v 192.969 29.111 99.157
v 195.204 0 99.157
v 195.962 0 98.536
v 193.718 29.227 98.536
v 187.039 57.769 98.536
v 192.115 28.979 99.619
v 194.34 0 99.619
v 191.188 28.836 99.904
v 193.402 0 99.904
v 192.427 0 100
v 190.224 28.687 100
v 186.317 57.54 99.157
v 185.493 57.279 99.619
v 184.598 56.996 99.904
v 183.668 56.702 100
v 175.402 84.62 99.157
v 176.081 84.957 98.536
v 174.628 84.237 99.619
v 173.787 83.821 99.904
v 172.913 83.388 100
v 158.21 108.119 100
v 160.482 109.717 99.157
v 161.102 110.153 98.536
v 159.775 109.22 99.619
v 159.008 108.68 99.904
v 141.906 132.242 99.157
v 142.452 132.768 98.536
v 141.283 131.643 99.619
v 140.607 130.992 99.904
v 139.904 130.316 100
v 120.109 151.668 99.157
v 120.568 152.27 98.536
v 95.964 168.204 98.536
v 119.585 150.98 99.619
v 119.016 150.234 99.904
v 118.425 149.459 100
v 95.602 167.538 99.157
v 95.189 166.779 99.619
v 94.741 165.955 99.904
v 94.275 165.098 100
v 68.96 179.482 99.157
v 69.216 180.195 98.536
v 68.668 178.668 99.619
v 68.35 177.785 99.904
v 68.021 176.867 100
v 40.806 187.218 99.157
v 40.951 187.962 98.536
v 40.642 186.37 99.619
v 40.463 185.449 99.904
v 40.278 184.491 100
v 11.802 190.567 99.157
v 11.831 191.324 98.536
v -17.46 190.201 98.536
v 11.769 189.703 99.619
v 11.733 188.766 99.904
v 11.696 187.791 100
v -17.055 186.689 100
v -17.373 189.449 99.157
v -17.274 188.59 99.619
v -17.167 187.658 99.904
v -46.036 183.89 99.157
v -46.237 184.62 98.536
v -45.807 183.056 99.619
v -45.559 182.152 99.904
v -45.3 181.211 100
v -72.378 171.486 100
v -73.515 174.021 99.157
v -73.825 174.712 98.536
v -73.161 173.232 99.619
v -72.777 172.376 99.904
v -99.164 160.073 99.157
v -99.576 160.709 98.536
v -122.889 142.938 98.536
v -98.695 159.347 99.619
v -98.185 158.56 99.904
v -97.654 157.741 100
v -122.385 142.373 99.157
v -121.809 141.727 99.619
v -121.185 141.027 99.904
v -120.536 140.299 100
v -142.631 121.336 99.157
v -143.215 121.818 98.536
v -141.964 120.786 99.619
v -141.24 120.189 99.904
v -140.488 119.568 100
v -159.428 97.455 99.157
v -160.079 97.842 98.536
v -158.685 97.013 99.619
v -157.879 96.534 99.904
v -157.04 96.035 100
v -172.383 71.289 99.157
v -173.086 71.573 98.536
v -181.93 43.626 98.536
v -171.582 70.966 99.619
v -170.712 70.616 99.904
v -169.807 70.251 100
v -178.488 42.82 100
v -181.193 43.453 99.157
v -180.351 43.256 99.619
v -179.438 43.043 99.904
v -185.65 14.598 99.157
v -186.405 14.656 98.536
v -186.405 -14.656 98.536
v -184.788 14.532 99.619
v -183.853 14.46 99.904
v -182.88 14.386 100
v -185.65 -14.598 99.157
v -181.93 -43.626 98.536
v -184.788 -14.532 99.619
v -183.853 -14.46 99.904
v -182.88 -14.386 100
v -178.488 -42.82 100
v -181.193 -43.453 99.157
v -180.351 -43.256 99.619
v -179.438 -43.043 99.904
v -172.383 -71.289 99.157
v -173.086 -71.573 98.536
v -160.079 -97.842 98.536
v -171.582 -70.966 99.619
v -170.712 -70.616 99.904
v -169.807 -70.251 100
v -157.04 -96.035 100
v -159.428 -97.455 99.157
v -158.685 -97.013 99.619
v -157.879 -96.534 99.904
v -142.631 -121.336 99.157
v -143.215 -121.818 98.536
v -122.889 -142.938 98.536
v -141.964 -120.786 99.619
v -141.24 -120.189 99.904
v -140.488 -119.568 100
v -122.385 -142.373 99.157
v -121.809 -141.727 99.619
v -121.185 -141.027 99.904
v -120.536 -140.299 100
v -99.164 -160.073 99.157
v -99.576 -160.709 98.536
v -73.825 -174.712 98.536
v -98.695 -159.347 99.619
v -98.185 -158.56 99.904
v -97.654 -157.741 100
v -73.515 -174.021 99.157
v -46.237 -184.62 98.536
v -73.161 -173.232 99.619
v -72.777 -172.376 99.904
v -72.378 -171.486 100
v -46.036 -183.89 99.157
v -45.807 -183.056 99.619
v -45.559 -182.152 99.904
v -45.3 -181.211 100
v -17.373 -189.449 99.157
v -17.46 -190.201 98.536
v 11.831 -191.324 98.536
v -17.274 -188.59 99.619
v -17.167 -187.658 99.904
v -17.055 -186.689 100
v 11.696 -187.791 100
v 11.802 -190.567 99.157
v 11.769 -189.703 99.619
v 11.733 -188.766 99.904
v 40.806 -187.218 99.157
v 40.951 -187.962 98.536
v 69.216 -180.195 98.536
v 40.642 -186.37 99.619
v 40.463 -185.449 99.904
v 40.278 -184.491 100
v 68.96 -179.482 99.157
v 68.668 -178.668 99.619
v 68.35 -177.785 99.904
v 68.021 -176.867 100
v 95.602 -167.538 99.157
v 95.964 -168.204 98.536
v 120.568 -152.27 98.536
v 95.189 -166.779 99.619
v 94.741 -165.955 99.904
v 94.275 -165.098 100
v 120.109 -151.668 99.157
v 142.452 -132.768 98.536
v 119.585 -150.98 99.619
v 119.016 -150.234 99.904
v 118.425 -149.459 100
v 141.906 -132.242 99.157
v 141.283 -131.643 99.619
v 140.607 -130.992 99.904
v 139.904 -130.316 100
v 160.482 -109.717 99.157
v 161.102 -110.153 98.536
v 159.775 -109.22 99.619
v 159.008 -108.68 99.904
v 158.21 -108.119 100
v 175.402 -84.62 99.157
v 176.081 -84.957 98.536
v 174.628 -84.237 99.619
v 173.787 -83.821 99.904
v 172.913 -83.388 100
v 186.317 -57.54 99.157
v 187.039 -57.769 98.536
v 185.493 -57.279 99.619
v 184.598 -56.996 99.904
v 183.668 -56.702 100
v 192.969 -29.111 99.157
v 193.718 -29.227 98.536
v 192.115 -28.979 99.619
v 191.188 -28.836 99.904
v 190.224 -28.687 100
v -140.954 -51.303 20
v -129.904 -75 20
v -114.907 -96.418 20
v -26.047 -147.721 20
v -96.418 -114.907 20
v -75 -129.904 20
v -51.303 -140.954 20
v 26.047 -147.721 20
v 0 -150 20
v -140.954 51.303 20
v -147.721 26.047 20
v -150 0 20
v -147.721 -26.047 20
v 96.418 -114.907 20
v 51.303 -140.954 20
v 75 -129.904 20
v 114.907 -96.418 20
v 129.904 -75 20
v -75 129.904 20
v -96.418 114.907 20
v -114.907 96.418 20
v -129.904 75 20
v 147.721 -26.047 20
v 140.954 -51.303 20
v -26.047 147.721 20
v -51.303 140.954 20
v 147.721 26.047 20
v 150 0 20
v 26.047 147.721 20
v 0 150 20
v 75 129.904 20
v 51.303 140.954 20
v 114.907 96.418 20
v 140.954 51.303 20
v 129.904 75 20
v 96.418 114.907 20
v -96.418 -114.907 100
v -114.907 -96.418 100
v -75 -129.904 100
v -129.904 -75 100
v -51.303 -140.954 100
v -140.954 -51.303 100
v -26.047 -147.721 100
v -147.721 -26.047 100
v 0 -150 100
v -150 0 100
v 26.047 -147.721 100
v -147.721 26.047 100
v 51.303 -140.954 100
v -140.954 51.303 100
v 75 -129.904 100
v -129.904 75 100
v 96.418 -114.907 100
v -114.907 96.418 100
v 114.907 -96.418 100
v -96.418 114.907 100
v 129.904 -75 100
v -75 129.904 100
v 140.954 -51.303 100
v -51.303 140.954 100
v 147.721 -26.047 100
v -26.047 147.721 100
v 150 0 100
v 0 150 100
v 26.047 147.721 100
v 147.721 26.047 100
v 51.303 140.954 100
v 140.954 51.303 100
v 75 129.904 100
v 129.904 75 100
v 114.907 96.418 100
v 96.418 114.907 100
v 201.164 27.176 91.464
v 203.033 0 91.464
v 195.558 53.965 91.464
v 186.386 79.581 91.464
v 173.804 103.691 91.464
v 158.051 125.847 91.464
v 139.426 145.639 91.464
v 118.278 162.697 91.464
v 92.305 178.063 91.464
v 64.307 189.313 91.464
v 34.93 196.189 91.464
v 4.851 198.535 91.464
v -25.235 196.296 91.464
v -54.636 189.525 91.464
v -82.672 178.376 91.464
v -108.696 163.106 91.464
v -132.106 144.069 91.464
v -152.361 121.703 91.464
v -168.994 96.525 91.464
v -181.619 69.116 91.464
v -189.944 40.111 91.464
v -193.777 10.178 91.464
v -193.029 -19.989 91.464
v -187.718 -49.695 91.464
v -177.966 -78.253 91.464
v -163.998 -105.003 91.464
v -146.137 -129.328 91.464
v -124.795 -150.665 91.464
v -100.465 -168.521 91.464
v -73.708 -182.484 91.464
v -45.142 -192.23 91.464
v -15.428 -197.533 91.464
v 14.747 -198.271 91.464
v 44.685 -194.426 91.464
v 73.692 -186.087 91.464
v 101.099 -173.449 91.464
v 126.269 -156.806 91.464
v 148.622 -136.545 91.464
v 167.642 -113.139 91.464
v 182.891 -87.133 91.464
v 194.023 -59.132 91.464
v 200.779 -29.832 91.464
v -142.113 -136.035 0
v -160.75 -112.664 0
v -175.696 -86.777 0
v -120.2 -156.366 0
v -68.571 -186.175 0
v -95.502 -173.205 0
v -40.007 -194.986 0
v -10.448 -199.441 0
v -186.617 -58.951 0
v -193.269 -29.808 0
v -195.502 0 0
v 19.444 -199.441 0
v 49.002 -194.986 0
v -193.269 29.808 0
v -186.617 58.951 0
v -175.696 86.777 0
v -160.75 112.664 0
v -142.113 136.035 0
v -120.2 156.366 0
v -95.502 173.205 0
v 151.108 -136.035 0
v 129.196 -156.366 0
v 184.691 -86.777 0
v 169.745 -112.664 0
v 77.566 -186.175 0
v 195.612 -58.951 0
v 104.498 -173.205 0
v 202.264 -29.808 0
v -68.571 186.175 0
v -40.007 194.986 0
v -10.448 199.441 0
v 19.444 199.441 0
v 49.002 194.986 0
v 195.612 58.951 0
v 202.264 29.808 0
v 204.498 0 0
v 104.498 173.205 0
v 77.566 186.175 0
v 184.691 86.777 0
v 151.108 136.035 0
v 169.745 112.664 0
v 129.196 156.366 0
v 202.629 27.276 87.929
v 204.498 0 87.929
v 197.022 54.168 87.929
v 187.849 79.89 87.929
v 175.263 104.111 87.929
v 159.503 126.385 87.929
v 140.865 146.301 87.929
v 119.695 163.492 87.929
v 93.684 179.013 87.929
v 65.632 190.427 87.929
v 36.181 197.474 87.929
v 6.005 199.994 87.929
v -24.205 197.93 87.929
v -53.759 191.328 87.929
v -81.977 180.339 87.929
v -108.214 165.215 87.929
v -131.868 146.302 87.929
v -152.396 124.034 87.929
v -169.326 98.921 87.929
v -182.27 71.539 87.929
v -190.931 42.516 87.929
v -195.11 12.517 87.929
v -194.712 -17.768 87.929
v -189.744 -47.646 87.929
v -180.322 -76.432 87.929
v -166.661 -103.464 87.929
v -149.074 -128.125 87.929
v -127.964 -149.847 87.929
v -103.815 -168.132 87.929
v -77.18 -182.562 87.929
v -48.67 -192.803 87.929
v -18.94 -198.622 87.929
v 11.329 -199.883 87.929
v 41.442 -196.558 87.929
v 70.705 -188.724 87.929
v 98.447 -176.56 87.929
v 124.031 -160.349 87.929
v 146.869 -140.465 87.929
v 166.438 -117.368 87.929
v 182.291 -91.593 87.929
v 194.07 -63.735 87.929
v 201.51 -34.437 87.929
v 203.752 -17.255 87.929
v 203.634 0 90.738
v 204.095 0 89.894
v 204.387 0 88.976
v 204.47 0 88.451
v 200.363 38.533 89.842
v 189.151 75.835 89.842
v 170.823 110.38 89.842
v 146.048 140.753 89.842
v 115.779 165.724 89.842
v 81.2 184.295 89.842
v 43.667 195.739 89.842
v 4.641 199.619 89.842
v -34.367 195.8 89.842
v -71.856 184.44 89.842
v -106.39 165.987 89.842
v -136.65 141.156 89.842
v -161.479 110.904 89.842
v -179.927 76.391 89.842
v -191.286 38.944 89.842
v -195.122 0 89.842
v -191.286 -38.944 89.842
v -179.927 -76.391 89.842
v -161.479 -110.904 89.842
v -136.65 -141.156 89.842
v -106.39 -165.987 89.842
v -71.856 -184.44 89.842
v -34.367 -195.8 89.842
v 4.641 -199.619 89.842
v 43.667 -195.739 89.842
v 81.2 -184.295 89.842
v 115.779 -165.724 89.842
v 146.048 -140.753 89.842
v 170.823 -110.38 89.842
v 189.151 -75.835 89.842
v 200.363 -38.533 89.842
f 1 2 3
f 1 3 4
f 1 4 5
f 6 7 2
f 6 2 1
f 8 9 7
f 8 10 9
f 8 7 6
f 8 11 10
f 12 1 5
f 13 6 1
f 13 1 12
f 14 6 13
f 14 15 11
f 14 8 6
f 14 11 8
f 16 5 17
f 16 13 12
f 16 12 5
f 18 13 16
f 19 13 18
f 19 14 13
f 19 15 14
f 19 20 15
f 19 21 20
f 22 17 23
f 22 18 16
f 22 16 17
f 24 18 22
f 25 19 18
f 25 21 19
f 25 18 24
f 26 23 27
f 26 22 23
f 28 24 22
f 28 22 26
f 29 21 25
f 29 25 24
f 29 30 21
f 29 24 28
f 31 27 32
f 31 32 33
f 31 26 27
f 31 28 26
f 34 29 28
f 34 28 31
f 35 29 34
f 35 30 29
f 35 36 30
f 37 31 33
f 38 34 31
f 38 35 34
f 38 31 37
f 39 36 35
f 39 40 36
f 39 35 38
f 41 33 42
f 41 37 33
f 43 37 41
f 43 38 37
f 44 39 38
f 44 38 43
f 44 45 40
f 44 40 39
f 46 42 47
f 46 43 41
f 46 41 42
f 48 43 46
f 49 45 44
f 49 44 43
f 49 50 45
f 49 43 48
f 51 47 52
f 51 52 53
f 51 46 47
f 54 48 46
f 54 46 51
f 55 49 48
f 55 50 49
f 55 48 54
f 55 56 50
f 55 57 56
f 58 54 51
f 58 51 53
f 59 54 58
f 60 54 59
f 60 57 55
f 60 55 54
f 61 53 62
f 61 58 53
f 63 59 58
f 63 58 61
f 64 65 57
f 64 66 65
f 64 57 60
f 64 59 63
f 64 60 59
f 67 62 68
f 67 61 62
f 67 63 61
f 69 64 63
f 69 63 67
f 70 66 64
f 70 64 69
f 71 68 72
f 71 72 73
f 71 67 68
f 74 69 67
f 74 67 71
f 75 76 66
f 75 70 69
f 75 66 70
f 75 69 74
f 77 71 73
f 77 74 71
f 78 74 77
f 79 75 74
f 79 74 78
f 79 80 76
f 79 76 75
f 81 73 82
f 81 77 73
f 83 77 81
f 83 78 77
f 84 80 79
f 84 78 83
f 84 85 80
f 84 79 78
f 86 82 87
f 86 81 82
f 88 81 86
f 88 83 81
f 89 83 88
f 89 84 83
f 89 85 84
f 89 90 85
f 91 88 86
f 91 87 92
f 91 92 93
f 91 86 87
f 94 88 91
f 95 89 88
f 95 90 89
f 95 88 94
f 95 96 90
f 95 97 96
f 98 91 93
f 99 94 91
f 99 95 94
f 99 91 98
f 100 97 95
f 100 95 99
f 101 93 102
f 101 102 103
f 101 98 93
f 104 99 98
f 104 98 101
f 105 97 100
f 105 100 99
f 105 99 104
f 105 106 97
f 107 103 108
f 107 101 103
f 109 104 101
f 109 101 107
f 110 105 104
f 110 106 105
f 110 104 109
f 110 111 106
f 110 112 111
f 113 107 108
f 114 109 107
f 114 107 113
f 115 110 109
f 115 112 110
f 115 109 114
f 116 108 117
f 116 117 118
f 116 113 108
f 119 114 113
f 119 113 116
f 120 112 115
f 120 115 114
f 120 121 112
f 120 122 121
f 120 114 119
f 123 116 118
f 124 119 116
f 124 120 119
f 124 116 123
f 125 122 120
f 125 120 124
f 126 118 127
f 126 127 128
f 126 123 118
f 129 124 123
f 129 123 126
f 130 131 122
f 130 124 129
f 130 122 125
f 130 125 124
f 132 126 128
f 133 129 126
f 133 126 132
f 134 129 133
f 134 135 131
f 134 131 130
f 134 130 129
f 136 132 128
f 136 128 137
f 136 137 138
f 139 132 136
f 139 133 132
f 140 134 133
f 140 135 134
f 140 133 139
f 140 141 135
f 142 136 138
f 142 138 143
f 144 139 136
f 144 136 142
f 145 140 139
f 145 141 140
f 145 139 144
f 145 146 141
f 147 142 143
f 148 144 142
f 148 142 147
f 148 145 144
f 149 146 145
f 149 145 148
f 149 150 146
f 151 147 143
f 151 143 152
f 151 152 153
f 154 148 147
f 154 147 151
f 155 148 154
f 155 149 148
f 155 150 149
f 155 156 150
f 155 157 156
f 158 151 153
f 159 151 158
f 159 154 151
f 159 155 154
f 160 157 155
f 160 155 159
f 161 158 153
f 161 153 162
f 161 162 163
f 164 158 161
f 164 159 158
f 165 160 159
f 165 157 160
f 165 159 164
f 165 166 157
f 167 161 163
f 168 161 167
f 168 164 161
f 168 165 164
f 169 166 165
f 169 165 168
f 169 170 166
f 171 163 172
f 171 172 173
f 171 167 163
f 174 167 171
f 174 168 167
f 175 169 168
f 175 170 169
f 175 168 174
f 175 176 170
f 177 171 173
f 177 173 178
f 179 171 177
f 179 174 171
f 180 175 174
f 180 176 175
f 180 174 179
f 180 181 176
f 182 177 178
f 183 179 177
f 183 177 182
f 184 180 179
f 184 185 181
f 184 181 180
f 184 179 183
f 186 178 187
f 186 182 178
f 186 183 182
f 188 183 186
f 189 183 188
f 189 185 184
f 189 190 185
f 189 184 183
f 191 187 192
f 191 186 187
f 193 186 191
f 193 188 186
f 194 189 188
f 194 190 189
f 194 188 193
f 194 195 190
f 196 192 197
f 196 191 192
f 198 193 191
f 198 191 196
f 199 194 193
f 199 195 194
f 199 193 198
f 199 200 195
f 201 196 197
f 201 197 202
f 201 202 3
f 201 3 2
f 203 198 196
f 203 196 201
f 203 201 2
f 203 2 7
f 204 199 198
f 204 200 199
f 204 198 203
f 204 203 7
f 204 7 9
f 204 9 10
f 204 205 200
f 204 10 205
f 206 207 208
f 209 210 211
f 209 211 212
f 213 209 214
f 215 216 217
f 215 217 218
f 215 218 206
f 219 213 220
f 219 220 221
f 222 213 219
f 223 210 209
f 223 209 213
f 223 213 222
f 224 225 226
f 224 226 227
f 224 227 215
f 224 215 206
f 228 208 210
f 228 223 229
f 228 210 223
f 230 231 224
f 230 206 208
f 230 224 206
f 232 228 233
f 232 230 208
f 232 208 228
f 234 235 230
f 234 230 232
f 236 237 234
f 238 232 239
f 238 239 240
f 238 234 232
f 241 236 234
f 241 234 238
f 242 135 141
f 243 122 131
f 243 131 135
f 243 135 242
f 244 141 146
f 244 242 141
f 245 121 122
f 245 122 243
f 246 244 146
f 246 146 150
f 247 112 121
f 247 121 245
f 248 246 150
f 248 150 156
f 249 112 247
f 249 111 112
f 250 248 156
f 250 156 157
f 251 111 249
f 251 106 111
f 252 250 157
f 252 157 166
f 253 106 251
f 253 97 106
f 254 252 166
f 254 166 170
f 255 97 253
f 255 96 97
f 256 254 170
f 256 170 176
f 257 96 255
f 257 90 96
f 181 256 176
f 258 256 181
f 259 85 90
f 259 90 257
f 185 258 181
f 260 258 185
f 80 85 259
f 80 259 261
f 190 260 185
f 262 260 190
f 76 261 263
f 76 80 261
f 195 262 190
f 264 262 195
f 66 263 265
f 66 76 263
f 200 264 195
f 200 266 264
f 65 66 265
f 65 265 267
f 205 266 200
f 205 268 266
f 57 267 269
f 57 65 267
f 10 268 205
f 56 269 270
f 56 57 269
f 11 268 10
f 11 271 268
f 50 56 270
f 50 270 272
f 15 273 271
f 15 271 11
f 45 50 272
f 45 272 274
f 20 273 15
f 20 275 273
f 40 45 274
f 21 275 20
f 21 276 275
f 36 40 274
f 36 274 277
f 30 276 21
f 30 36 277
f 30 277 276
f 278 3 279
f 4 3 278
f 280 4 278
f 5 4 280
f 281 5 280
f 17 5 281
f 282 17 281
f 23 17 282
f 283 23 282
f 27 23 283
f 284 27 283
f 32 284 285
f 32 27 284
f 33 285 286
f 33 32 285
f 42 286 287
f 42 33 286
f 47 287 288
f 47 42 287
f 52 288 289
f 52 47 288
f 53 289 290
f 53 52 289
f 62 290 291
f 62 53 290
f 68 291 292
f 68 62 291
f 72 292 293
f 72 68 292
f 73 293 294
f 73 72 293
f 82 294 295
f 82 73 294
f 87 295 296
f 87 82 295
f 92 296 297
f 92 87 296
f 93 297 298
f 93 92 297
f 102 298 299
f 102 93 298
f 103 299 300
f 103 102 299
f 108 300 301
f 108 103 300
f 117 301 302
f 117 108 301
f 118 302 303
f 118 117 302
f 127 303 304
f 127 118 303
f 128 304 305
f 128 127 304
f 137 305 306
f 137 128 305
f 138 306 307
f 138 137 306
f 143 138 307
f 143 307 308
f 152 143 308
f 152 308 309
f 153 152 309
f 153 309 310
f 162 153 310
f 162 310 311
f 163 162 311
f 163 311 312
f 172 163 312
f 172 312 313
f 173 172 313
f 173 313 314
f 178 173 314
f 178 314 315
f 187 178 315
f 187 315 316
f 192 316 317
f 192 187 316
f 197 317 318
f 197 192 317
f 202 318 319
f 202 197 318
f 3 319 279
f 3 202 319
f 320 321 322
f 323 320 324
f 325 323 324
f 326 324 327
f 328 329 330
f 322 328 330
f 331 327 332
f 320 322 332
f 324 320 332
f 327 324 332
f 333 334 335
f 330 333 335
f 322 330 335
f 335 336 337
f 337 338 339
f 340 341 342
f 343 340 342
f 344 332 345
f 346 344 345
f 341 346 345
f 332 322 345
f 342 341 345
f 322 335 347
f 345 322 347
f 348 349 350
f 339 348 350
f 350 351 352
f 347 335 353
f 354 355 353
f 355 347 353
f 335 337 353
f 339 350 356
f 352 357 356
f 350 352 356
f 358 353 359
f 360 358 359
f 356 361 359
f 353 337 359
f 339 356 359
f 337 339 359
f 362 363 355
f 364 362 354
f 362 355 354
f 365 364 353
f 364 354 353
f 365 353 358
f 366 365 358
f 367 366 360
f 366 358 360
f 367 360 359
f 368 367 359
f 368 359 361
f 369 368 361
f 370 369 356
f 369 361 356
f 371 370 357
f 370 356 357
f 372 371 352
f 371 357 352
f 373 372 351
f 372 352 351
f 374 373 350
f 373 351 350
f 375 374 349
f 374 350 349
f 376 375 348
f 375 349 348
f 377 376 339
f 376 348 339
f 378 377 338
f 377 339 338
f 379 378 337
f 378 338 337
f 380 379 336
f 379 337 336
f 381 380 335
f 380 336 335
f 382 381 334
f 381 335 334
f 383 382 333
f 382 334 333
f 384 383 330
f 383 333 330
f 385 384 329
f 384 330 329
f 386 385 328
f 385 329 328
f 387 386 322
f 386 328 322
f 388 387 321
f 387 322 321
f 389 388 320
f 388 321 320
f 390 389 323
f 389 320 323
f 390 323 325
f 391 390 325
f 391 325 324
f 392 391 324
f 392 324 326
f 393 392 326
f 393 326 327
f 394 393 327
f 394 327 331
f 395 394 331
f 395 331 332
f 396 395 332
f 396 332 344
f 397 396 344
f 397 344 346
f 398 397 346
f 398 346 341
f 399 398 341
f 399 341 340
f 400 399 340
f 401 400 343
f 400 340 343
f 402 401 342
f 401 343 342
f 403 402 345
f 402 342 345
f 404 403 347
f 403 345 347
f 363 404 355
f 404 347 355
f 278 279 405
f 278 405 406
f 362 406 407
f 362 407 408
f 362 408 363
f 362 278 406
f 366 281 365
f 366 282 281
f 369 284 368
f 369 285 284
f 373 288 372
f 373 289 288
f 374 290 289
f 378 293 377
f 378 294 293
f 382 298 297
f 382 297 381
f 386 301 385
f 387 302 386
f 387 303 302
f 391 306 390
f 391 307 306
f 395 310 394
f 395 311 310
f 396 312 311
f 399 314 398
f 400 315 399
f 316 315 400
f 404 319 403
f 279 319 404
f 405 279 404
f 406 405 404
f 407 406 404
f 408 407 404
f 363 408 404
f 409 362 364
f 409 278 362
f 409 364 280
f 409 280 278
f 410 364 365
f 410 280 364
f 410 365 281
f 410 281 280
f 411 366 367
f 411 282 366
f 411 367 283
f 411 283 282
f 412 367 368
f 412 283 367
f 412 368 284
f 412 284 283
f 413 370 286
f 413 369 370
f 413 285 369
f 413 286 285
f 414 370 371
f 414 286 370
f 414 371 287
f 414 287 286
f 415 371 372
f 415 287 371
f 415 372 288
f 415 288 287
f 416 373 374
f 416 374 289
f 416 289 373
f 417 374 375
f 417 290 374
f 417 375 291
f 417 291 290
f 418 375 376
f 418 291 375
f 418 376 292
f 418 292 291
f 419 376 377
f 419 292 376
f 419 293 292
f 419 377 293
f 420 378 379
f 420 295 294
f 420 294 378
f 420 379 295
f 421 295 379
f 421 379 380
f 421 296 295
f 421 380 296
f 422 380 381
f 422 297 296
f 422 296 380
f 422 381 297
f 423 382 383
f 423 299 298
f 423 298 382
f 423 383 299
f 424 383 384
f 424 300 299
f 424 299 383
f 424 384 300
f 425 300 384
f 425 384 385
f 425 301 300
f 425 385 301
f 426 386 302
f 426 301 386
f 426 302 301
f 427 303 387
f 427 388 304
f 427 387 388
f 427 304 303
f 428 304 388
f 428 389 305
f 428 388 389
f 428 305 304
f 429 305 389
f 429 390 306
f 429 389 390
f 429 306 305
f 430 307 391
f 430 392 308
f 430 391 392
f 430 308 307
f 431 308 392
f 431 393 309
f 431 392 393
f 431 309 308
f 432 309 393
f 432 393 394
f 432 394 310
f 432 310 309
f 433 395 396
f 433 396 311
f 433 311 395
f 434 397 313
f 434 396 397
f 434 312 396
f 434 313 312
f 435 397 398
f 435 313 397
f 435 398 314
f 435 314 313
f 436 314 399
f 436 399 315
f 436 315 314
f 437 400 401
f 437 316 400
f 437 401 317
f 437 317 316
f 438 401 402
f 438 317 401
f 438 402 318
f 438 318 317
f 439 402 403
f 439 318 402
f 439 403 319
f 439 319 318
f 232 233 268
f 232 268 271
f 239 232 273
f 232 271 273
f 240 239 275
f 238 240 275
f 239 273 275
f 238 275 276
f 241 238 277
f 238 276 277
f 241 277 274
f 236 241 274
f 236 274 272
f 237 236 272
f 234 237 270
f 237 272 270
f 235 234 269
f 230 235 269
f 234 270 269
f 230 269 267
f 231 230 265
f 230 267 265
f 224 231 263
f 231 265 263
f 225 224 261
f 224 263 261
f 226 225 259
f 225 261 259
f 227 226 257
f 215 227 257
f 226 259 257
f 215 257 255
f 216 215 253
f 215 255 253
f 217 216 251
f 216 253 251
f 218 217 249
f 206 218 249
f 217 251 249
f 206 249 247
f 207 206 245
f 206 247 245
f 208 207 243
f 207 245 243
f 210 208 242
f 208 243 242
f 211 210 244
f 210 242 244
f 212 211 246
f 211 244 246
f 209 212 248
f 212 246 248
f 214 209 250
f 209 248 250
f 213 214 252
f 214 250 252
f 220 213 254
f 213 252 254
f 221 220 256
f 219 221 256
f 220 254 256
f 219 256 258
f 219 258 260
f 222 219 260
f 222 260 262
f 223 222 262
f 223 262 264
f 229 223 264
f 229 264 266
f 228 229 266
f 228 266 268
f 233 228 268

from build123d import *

# Parameters (mm, degrees)
F0_R     = 200
F1_DEPTH = 100
F2_R     = 150
F3_DEPTH = 80
F4_SIZE  = 10
F5_R     = 5
F6_R     = 5


with BuildPart() as f1:
    # F0 (on Top) → F1 (new body)
    with BuildSketch(Plane.XY):
        with Locations((4.4975979886, 0)):
            Circle(F0_R)
    extrude(amount=F1_DEPTH)

    # F2 (on face) → F3 (cut)
    with BuildSketch(Plane.XY.offset(100)):
        Circle(F2_R)
    extrude(amount=-F3_DEPTH, mode=Mode.SUBTRACT)

    # F4
    f4_edges = [f1.edges().sort_by_distance(p)[0] for p in [
        (-195.502402, 0, 100),
    ]]
    chamfer(f4_edges, length=F4_SIZE)

    # F5
    f5_edges = [f1.edges().sort_by_distance(p)[0] for p in [
        (-185.502402, 0, 100),
    ]]
    fillet(f5_edges, radius=F5_R)

    # F6
    f6_edges = [f1.edges().sort_by_distance(p)[0] for p in [
        (-195.502402, 0, 90),
    ]]
    fillet(f6_edges, radius=F6_R)


solid = f1.part
